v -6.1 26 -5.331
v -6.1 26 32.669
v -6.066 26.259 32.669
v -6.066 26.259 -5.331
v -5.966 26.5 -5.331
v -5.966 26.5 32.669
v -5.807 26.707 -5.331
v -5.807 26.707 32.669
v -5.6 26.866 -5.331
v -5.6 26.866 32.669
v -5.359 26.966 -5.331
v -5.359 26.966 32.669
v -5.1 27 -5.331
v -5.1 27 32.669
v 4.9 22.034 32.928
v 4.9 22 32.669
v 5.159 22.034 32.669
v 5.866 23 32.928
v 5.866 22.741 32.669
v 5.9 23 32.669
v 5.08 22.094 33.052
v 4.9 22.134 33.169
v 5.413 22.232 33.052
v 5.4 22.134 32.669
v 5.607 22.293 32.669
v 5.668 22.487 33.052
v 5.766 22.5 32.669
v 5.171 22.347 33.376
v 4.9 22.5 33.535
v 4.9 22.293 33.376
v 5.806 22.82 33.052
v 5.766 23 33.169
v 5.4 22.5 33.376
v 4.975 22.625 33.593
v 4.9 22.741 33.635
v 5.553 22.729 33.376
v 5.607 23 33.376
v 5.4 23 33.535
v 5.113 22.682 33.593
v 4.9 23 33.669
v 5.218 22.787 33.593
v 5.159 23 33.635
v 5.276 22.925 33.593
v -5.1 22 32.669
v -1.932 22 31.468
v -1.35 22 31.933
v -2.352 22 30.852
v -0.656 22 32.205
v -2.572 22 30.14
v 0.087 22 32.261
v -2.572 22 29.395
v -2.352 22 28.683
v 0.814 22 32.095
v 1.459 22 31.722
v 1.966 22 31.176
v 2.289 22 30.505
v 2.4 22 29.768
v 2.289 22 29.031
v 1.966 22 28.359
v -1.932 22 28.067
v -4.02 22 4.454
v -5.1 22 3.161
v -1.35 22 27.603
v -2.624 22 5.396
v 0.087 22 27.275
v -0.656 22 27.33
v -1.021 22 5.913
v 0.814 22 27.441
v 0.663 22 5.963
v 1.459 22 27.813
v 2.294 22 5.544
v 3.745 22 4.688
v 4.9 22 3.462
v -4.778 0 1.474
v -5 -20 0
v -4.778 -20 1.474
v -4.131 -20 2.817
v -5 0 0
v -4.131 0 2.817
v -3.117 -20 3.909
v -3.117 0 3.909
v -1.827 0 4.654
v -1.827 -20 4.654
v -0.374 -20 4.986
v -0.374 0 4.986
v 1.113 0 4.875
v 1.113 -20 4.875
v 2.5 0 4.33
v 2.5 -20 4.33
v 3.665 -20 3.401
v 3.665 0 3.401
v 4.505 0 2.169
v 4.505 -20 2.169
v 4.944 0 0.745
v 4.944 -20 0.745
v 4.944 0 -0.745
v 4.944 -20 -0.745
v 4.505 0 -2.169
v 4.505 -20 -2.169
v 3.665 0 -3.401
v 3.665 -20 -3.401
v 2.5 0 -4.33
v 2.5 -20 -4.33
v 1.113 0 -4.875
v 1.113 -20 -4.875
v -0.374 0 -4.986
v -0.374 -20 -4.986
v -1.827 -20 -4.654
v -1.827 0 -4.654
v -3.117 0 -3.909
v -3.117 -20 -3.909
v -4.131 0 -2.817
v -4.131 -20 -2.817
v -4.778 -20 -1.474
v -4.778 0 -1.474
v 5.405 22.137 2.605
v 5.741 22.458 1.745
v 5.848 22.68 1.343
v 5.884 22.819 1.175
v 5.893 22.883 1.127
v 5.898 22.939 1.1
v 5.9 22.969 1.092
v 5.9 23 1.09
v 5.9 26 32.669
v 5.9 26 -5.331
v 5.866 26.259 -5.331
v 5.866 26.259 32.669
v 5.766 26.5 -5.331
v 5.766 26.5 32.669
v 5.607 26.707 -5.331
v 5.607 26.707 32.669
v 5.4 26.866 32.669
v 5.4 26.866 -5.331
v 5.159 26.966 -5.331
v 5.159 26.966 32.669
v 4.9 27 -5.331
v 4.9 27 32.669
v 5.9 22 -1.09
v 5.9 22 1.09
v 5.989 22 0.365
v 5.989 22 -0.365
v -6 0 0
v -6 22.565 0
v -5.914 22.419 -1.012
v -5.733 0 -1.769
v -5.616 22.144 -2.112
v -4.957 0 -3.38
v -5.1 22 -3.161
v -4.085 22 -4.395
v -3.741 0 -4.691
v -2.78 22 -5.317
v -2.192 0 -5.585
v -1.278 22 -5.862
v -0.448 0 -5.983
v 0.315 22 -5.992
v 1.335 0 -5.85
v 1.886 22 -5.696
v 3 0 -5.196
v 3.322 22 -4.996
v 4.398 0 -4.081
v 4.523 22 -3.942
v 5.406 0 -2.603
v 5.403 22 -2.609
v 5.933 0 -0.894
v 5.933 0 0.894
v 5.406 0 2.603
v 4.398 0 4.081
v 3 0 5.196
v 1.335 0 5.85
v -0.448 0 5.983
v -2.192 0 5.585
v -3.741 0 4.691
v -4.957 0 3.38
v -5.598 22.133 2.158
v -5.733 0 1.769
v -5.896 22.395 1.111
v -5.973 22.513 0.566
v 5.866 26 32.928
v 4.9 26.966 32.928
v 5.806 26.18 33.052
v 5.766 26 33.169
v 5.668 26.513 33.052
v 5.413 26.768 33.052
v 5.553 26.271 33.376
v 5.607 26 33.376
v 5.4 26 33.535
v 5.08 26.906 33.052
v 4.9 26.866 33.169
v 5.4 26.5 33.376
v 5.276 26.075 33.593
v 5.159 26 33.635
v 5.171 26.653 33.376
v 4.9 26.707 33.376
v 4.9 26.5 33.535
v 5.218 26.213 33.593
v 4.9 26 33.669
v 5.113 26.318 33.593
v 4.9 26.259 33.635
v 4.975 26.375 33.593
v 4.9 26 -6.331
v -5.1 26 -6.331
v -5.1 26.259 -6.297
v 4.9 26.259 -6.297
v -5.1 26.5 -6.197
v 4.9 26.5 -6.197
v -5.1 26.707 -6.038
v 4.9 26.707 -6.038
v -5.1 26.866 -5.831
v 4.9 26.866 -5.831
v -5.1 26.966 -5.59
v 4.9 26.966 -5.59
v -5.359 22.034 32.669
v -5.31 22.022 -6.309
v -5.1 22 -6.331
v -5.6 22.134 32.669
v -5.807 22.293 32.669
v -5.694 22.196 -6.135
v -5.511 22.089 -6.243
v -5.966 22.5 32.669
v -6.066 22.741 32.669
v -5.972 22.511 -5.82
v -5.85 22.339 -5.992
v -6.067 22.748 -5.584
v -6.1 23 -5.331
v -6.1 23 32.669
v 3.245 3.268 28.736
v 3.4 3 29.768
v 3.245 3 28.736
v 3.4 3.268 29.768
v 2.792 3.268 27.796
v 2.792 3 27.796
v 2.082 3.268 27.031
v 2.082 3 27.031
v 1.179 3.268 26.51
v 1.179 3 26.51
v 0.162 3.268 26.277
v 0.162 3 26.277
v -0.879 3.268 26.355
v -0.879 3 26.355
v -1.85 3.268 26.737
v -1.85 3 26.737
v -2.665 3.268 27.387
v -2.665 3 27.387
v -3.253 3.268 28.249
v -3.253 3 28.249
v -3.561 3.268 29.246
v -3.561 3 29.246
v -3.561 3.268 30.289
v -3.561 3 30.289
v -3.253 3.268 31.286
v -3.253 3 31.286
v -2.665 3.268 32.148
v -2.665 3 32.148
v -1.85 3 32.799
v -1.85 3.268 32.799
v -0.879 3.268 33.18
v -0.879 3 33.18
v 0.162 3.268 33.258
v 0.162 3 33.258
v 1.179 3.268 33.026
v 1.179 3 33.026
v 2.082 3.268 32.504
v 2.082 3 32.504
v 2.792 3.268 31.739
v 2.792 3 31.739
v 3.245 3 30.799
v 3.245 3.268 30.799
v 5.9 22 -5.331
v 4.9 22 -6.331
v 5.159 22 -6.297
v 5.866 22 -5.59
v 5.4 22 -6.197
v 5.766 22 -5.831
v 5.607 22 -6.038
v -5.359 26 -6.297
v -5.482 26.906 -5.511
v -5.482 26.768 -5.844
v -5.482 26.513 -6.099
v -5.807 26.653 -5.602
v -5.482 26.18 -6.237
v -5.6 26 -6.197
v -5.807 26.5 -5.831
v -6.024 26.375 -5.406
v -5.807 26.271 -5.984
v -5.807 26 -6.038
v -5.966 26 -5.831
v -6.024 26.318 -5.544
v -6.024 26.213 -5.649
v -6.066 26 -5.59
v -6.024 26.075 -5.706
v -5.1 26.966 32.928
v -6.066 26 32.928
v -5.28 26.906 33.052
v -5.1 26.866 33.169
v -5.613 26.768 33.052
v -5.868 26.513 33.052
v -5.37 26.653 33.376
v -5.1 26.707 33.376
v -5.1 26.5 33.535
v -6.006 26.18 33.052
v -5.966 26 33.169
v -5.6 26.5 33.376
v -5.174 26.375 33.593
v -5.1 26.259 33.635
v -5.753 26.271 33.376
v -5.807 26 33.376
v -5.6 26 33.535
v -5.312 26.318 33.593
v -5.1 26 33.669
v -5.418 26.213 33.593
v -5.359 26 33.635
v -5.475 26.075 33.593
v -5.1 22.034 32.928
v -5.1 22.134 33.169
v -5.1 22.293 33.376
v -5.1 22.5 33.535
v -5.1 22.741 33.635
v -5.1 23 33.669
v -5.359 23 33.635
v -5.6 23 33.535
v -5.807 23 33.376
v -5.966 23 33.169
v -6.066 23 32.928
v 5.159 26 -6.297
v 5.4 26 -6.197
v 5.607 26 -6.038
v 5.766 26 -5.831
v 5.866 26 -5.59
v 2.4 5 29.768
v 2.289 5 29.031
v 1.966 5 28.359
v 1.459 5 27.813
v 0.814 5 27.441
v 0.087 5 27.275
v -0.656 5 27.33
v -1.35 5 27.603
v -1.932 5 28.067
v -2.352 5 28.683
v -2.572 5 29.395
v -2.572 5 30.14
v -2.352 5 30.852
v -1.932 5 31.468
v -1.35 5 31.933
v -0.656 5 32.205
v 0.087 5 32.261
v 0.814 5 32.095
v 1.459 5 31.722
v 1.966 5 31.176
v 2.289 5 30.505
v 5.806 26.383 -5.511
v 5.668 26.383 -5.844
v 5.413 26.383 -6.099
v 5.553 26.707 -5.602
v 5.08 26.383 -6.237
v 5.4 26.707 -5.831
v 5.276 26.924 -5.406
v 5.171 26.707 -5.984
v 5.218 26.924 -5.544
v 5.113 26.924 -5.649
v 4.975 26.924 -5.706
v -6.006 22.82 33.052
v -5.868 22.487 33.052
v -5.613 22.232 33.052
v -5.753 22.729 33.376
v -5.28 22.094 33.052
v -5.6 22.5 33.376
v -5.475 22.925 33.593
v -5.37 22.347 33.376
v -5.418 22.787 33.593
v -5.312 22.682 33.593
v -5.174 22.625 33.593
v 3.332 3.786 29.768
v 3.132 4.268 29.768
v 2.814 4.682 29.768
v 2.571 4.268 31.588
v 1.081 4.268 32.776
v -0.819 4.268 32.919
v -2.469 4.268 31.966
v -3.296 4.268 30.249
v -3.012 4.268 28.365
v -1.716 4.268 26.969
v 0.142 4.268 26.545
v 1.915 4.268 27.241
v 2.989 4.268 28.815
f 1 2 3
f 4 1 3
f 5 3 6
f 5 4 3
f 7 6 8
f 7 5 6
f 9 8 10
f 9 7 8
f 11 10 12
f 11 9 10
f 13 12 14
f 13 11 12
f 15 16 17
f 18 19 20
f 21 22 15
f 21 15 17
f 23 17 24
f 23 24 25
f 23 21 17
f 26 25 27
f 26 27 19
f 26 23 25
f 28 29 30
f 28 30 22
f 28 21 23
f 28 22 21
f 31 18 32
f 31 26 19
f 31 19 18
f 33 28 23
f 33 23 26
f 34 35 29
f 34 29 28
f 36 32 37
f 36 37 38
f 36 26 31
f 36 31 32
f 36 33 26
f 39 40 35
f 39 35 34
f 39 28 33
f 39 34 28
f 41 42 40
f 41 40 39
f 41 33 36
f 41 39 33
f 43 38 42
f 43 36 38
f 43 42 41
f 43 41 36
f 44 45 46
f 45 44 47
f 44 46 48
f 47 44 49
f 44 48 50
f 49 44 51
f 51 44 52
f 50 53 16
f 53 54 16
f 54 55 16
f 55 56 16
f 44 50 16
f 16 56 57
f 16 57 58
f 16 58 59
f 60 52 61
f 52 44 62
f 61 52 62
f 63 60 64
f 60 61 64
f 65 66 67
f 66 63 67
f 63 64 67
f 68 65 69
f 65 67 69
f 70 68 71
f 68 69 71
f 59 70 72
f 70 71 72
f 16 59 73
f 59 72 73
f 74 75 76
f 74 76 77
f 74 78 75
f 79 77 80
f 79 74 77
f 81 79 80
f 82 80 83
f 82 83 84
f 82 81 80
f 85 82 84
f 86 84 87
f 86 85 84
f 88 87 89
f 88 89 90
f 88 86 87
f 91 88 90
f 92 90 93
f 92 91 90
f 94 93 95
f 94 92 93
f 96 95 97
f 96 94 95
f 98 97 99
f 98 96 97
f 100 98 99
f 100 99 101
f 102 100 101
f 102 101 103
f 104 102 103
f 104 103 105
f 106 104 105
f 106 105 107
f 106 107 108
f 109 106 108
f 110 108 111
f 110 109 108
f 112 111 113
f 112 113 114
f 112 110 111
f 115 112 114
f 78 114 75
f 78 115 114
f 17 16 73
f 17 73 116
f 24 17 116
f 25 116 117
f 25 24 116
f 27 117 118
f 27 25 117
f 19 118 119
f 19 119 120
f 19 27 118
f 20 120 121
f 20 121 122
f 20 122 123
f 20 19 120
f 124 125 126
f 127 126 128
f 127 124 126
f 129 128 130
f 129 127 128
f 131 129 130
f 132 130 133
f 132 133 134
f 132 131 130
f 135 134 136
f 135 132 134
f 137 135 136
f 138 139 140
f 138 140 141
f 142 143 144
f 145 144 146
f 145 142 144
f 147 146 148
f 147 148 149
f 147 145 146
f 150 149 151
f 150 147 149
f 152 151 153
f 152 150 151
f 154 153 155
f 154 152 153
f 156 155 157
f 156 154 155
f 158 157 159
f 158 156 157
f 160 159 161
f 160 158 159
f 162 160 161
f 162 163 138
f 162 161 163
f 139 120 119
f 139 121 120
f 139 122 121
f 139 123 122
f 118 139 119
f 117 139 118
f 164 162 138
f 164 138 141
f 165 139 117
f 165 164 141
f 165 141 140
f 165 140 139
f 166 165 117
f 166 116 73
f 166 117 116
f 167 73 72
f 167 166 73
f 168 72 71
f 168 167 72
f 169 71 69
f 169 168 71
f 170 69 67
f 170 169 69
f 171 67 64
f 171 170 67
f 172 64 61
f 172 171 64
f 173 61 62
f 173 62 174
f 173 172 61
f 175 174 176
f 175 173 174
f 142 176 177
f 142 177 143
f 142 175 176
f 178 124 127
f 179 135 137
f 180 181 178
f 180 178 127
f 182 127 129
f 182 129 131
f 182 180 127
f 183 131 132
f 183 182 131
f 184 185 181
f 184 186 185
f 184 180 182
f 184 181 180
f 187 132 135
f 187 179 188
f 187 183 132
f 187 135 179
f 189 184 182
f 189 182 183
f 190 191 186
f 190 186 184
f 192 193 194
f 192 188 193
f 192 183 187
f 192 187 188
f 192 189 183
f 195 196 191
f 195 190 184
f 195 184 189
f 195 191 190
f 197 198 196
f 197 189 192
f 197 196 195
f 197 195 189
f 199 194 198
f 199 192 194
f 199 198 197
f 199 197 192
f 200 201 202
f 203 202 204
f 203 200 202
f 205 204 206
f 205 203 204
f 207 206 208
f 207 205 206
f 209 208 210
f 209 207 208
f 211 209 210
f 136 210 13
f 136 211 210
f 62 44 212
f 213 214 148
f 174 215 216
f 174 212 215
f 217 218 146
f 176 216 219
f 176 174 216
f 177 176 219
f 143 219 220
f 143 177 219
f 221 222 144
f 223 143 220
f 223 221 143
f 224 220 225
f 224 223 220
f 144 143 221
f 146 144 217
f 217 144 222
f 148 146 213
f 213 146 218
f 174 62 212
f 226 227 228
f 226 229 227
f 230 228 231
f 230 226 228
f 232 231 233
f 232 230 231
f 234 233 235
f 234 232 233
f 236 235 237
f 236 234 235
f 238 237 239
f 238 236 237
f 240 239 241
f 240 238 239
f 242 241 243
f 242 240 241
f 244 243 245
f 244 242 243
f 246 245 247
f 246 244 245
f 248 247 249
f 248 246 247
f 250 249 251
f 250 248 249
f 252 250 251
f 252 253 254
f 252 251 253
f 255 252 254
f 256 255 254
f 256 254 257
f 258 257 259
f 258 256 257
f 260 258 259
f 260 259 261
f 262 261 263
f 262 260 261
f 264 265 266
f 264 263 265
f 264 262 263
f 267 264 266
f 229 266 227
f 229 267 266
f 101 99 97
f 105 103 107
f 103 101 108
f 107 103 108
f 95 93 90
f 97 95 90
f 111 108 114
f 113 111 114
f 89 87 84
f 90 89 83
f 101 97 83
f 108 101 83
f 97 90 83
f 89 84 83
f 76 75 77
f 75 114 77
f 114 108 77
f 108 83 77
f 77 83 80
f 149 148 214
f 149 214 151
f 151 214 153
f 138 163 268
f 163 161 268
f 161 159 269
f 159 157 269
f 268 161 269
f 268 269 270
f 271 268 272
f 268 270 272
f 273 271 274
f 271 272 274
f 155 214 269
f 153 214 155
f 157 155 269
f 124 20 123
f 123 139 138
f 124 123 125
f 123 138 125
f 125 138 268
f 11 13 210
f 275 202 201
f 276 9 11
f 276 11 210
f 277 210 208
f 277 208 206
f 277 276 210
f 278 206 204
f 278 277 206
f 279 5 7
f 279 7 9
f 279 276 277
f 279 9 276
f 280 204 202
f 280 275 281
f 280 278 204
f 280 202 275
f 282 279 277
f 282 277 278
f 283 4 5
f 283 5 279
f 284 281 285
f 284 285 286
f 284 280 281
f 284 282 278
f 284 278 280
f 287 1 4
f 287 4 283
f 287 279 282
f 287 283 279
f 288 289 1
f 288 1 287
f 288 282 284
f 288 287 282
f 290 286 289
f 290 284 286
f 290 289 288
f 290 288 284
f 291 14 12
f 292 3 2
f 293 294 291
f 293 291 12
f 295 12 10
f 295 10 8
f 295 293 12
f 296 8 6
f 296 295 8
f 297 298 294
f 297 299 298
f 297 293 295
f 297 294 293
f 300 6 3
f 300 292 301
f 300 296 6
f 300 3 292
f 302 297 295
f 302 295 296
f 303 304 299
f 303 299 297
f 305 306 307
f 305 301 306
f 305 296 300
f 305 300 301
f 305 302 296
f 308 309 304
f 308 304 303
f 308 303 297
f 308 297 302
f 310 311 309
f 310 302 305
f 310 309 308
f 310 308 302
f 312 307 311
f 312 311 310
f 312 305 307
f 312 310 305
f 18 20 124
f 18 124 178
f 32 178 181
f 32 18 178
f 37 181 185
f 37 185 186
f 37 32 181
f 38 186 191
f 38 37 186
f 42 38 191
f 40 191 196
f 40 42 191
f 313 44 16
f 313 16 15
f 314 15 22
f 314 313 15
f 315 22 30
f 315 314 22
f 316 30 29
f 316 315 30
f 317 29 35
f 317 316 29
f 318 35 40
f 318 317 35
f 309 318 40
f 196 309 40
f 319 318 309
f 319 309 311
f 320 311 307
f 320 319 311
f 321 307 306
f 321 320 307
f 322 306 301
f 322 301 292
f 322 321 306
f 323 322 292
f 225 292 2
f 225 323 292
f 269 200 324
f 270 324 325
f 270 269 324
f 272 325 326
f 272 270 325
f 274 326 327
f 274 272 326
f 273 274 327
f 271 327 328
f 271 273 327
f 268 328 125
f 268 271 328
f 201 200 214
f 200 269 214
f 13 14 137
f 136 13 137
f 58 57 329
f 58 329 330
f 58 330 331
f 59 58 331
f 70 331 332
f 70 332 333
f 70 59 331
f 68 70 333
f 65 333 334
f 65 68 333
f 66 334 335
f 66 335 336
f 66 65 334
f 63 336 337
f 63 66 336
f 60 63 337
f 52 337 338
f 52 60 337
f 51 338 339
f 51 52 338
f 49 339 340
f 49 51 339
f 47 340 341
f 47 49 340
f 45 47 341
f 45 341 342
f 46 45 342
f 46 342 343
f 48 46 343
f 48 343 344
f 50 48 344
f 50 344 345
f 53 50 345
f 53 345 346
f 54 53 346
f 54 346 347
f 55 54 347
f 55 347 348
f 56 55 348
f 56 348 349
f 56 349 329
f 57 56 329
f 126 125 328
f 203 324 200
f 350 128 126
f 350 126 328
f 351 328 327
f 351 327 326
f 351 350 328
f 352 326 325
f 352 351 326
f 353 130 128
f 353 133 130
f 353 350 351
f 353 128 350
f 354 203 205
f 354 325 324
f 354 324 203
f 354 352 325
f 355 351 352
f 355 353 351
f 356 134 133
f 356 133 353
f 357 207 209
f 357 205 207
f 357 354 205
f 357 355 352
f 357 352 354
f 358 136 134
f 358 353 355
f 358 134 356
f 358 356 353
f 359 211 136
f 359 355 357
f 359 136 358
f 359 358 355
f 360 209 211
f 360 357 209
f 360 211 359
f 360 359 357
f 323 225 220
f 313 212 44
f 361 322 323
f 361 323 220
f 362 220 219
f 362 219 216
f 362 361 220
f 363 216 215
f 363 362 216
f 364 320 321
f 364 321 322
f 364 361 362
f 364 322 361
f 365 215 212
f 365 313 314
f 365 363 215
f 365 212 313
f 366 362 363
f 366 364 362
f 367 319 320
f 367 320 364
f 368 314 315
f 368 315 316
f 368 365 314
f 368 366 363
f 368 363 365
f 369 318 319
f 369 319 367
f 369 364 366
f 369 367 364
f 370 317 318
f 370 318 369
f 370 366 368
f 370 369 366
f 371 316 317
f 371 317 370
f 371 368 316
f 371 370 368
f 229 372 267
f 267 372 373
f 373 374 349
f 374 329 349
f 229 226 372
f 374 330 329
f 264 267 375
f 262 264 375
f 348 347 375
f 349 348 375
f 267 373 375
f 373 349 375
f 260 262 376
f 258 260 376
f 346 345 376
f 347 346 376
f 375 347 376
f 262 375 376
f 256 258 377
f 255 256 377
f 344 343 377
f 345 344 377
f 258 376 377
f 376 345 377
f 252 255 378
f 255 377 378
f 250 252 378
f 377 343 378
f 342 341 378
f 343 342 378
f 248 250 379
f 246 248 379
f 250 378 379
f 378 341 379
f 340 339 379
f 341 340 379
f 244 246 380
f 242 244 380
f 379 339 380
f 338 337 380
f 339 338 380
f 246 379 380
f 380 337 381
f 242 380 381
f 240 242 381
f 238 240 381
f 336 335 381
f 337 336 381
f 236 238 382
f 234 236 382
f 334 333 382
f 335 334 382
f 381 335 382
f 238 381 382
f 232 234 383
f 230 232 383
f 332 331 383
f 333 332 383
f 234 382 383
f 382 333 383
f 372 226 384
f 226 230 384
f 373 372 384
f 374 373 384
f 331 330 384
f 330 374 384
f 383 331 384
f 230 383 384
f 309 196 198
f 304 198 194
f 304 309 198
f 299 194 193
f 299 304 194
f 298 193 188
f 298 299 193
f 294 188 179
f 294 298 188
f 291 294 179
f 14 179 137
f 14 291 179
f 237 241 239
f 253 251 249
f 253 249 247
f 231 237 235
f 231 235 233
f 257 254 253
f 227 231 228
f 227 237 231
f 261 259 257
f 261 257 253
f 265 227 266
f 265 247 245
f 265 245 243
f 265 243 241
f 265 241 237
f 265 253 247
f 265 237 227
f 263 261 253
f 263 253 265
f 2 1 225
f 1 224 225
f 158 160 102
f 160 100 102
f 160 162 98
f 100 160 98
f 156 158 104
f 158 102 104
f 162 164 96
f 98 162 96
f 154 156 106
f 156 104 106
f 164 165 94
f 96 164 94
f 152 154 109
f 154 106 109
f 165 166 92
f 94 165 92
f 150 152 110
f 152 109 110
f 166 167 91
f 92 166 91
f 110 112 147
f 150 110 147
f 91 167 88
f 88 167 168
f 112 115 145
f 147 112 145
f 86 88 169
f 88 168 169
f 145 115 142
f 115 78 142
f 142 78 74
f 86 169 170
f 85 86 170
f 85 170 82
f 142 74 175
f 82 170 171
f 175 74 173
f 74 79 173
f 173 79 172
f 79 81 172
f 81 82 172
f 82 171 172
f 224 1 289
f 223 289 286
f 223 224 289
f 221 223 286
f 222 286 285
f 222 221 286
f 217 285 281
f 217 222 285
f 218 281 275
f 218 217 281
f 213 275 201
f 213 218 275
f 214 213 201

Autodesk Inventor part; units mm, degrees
ref_plane "YZ Plane" through (0, 0, 0) normal (1, 0, 0) x (0, 1, 0)
ref_plane "XZ Plane" through (0, 0, 0) normal (0, 1, 0) x (-1, 0, 0)
ref_plane "XY Plane" through (0, 0, 0) normal (0, 0, 1) x (1, 0, 0)
sketch "Sketch1" plane through (0, 0, 0) normal (0, 1, 0) x (-1, 0, 0)
  circle A0 centre (0, 0) radius 5
  circle A1 centre (0, 0) radius 6
  dimension "d0" = 10
  dimension "d1" = 12
extrude "Extrusion1" add sketch "Sketch1" against normal blind 20 contours A0
extrude "Extrusion2" add sketch "Sketch1" along normal blind 22 contours A0 | A1
sketch "Sketch2" plane through (0, 22, 0) normal (0, 1, 0) x (1, 0, 0)
  line L0 (-6.0998, -33.6689) -> (5.9002, -33.6689)
  line L1 (5.9002, -33.6689) -> (5.9002, 6.3311)
  line L2 (5.9002, 6.3311) -> (-6.0998, 6.3311)
  line L3 (-6.0998, 6.3311) -> (-6.0998, -33.6689)
  circle A0 centre (-0.0998, -29.7677) radius 2.5
  point P0 (0, 0)
  dimension "d8" = 12
  dimension "d9" = 40
  dimension "d15" = 5
extrude "Extrusion3" add sketch "Sketch2" along normal blind 5 contours L3 L2 L1 L0 | A0
fillet "Fillet1" radius 1 11 edges at (5.9002, 27, 13.6689) (5.9002, 22, 17.3793) (5.9002, 24.5, -6.3311) (-0.0998, 27, -6.3311) (-6.0998, 27, 13.6689) (-0.0998, 27, 33.6689) (-6.0998, 24.5, 33.6689) (-6.0998, 22, 13.6689) (-6.0998, 24.5, -6.3311) (-0.0998, 22, 33.6689) (5.9002, 24.5, 33.6689)
thread "Thread1" size "M10x1.5" class "6g" standard "ANSI Metric M Profile" full length
extrude "Extrusion4" add sketch "Sketch2" against normal blind 17 contours A0
sketch "Sketch3" plane through (-0.0998, 5, 29.7677) normal (0, -1, 0) x (1, 0, 0)
  circle A0 centre (0, 0) radius 3.5
  point P0 (0.0998, -29.7677)
  dimension "d18" = 7
extrude "Extrusion5" add sketch "Sketch3" along normal blind 2
fillet "Fillet2" radius 2 1 edges at (-3.5998, 5, 29.7677)
sketch "Sketch4" plane through (-0.0998, 3, 29.7677) normal (0, -1, 0) x (1, 0, 0)
  point P0 (0.0998, -29.7677)
properties part number "clamp" material "Steel, Carbon"
